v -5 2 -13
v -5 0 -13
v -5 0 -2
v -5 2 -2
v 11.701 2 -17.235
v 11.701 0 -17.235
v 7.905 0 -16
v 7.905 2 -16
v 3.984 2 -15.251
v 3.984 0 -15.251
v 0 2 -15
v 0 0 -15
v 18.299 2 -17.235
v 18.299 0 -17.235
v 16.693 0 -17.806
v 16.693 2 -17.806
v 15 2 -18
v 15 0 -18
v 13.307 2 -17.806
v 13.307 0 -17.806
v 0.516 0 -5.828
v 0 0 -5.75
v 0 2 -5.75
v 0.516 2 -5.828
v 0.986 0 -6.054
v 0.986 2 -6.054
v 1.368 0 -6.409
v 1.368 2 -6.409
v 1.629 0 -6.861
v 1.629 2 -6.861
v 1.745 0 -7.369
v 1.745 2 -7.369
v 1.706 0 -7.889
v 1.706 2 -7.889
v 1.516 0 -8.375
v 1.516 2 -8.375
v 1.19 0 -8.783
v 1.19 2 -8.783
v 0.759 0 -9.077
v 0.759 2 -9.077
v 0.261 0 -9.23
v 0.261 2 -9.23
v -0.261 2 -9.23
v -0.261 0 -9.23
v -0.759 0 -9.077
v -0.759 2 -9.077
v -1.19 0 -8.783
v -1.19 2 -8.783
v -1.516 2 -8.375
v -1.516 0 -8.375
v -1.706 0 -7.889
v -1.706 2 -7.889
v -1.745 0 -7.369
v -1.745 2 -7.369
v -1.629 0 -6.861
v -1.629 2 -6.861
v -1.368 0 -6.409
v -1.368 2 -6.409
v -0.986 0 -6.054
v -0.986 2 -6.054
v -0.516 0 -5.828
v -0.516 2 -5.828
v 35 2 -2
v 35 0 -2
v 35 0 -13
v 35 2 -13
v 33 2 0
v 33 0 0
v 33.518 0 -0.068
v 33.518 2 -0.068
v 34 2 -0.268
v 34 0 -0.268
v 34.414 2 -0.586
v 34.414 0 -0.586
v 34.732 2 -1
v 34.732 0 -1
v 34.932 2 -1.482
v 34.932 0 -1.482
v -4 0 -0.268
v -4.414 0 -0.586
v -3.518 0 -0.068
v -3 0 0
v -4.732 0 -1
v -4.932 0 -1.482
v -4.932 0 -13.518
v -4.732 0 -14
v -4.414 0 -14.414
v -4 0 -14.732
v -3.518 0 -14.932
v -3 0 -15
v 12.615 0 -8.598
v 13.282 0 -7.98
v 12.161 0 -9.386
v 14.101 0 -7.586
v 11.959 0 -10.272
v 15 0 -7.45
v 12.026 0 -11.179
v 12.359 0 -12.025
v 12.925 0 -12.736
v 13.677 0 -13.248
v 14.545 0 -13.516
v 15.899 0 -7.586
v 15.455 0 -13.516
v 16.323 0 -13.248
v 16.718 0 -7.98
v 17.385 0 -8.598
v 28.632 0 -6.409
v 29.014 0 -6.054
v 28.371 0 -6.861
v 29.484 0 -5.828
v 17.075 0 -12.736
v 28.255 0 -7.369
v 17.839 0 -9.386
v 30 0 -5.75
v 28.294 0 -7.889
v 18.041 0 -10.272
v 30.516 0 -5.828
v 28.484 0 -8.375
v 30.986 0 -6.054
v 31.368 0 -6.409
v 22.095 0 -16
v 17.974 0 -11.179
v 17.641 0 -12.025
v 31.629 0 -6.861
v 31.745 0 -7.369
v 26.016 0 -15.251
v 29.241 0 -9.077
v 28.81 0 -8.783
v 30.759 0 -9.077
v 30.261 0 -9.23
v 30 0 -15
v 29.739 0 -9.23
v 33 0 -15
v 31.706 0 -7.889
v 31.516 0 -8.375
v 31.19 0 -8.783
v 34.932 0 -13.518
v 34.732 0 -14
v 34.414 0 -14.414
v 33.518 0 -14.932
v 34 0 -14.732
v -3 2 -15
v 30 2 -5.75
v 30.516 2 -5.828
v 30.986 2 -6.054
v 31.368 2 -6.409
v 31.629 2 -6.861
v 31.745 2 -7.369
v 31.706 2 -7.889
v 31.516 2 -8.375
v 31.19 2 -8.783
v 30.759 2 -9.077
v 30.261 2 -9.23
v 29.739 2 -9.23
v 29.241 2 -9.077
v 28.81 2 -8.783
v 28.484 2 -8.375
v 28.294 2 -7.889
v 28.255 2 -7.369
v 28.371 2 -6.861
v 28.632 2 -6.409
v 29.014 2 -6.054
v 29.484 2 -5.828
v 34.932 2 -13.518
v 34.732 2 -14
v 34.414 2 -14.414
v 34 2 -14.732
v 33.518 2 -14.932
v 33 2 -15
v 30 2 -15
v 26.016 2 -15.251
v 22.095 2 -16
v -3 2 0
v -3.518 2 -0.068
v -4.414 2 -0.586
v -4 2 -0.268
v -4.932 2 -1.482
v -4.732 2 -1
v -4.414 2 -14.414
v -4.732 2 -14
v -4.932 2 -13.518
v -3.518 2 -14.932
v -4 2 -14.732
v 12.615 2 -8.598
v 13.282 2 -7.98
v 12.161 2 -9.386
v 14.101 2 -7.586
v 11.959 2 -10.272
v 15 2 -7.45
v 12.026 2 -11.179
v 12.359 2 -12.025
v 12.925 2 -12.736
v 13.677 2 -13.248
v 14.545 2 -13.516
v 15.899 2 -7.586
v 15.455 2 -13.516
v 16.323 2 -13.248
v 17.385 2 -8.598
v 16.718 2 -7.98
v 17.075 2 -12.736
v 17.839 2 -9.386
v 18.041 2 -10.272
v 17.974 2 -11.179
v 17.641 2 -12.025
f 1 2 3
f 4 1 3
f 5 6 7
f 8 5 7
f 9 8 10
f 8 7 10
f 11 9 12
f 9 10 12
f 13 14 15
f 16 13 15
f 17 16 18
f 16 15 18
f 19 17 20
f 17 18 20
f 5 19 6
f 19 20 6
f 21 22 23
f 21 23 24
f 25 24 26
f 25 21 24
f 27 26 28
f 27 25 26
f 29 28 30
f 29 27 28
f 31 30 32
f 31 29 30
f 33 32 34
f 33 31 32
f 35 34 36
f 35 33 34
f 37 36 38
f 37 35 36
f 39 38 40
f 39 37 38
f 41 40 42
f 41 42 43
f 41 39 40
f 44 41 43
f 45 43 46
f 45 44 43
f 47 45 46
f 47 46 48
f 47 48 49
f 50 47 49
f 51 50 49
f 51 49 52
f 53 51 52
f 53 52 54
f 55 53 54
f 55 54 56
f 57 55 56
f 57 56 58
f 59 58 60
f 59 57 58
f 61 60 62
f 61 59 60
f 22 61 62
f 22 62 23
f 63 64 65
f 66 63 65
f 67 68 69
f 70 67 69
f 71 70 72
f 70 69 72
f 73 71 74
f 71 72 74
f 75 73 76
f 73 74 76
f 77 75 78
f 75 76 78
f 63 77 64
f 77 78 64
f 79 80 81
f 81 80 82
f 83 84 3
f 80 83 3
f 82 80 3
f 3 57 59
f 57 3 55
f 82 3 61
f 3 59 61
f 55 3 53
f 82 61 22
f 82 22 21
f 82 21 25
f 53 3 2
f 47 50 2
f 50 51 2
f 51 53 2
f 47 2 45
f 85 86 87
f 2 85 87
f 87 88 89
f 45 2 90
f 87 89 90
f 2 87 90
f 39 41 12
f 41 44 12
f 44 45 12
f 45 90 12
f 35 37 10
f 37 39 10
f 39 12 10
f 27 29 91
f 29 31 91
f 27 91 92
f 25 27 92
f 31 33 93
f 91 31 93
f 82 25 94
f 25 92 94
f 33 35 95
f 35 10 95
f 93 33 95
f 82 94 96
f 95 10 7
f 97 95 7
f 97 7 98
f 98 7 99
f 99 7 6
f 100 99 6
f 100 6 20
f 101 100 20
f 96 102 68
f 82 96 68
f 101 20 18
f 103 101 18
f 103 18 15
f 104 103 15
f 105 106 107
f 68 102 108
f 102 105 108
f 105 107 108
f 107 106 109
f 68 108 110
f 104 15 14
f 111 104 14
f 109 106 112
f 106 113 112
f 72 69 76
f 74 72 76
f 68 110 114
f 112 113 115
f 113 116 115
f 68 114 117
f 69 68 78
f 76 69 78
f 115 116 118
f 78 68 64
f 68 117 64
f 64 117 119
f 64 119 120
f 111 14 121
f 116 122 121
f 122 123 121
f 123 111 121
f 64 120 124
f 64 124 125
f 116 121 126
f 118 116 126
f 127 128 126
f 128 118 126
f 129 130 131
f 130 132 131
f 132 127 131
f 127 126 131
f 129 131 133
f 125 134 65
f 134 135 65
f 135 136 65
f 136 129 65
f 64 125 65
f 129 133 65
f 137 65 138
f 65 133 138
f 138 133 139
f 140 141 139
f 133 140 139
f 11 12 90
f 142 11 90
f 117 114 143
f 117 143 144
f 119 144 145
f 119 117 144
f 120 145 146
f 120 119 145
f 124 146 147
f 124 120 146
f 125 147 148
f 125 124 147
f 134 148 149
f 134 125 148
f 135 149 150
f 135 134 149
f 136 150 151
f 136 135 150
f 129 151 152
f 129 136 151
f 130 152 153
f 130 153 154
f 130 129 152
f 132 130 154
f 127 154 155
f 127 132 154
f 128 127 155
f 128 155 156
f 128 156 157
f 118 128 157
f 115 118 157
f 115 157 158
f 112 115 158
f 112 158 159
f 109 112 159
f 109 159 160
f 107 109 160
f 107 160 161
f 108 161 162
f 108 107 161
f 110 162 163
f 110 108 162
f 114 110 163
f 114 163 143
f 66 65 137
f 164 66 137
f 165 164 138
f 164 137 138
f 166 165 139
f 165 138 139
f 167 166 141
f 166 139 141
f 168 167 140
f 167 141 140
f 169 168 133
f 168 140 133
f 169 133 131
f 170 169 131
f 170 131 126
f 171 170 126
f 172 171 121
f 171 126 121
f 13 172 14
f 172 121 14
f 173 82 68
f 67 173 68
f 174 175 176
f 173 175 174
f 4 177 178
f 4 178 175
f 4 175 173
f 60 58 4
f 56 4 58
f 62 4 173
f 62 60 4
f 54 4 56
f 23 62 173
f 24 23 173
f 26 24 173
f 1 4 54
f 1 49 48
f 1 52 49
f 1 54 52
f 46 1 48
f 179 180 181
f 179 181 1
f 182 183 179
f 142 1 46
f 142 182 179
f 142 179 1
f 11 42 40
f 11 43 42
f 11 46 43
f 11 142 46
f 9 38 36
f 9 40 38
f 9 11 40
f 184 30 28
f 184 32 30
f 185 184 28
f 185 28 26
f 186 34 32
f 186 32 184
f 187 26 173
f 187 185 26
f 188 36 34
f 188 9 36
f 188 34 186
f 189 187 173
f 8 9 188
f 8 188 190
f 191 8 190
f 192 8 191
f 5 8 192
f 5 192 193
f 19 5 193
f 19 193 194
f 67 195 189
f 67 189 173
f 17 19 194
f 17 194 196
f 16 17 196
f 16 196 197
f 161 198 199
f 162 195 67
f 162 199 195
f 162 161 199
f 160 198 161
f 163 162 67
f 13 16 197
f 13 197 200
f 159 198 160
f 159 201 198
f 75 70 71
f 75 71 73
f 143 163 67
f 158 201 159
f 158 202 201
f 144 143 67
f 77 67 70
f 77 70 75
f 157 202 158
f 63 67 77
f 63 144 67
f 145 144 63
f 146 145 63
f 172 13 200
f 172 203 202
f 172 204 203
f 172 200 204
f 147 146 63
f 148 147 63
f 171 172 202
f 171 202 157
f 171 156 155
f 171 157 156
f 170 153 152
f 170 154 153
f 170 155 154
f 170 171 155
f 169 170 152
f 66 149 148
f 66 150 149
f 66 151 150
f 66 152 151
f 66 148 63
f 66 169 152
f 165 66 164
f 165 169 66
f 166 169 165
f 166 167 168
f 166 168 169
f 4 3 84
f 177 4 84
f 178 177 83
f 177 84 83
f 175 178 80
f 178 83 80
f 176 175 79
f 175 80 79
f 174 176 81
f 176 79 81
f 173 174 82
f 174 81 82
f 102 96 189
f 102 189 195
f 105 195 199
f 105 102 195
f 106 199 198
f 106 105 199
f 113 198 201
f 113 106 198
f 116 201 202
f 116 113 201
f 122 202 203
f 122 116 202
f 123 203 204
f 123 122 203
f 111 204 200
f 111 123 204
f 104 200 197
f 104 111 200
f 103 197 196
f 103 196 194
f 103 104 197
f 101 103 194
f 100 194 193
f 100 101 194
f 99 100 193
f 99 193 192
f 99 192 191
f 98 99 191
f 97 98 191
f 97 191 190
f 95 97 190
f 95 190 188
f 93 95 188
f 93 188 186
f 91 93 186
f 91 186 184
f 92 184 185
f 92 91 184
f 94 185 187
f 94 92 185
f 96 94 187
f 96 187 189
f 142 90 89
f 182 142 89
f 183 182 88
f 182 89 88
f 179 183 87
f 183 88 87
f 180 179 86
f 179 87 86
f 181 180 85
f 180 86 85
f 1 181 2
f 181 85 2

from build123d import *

# Parameters (mm, degrees)
SKETCH_1_R      = 1.75
SKETCH_1_R_2    = 3.05
EXTRUDE_1_DEPTH = 2


with BuildPart() as part:
    # 草图1 → 凸台-拉伸1 (new body)
    with BuildSketch(Plane(origin=(0, 0, 0), x_dir=(1, 0, 0), z_dir=(0, 1, 0))):
        with BuildLine():
            ThreePointArc((11.700960917, 17.23545404), (5.956293754, 15.563872091), (0, 15))
            Line((0, 15), (-3, 15))
            ThreePointArc((-3, 15), (-4.414213562, 14.414213562), (-5, 13))
            Line((-5, 13), (-5, 2))
            ThreePointArc((-5, 2), (-4.414213562, 0.585786438), (-3, 0))
            Line((-3, 0), (33, 0))
            ThreePointArc((33, 0), (34.414213562, 0.585786438), (35, 2))
            Line((35, 2), (35, 13))
            ThreePointArc((35, 13), (34.414213562, 14.414213562), (33, 15))
            Line((33, 15), (30, 15))
            ThreePointArc((30, 15), (24.043706246, 15.563872091), (18.299039083, 17.23545404))
            ThreePointArc((18.299039083, 17.23545404), (15, 18), (11.700960917, 17.23545404))
        make_face()
        with Locations(Location((30, 7.5, 0), (0, 0, 270))):
            Circle(SKETCH_1_R, mode=Mode.SUBTRACT)
        with Locations(Location((0, 7.5, 0), (0, 0, 270))):
            Circle(SKETCH_1_R, mode=Mode.SUBTRACT)
        with Locations(Location((15, 10.5, 0), (0, 0, 270))):
            Circle(SKETCH_1_R_2, mode=Mode.SUBTRACT)
    extrude(amount=EXTRUDE_1_DEPTH)


solid = part.part
